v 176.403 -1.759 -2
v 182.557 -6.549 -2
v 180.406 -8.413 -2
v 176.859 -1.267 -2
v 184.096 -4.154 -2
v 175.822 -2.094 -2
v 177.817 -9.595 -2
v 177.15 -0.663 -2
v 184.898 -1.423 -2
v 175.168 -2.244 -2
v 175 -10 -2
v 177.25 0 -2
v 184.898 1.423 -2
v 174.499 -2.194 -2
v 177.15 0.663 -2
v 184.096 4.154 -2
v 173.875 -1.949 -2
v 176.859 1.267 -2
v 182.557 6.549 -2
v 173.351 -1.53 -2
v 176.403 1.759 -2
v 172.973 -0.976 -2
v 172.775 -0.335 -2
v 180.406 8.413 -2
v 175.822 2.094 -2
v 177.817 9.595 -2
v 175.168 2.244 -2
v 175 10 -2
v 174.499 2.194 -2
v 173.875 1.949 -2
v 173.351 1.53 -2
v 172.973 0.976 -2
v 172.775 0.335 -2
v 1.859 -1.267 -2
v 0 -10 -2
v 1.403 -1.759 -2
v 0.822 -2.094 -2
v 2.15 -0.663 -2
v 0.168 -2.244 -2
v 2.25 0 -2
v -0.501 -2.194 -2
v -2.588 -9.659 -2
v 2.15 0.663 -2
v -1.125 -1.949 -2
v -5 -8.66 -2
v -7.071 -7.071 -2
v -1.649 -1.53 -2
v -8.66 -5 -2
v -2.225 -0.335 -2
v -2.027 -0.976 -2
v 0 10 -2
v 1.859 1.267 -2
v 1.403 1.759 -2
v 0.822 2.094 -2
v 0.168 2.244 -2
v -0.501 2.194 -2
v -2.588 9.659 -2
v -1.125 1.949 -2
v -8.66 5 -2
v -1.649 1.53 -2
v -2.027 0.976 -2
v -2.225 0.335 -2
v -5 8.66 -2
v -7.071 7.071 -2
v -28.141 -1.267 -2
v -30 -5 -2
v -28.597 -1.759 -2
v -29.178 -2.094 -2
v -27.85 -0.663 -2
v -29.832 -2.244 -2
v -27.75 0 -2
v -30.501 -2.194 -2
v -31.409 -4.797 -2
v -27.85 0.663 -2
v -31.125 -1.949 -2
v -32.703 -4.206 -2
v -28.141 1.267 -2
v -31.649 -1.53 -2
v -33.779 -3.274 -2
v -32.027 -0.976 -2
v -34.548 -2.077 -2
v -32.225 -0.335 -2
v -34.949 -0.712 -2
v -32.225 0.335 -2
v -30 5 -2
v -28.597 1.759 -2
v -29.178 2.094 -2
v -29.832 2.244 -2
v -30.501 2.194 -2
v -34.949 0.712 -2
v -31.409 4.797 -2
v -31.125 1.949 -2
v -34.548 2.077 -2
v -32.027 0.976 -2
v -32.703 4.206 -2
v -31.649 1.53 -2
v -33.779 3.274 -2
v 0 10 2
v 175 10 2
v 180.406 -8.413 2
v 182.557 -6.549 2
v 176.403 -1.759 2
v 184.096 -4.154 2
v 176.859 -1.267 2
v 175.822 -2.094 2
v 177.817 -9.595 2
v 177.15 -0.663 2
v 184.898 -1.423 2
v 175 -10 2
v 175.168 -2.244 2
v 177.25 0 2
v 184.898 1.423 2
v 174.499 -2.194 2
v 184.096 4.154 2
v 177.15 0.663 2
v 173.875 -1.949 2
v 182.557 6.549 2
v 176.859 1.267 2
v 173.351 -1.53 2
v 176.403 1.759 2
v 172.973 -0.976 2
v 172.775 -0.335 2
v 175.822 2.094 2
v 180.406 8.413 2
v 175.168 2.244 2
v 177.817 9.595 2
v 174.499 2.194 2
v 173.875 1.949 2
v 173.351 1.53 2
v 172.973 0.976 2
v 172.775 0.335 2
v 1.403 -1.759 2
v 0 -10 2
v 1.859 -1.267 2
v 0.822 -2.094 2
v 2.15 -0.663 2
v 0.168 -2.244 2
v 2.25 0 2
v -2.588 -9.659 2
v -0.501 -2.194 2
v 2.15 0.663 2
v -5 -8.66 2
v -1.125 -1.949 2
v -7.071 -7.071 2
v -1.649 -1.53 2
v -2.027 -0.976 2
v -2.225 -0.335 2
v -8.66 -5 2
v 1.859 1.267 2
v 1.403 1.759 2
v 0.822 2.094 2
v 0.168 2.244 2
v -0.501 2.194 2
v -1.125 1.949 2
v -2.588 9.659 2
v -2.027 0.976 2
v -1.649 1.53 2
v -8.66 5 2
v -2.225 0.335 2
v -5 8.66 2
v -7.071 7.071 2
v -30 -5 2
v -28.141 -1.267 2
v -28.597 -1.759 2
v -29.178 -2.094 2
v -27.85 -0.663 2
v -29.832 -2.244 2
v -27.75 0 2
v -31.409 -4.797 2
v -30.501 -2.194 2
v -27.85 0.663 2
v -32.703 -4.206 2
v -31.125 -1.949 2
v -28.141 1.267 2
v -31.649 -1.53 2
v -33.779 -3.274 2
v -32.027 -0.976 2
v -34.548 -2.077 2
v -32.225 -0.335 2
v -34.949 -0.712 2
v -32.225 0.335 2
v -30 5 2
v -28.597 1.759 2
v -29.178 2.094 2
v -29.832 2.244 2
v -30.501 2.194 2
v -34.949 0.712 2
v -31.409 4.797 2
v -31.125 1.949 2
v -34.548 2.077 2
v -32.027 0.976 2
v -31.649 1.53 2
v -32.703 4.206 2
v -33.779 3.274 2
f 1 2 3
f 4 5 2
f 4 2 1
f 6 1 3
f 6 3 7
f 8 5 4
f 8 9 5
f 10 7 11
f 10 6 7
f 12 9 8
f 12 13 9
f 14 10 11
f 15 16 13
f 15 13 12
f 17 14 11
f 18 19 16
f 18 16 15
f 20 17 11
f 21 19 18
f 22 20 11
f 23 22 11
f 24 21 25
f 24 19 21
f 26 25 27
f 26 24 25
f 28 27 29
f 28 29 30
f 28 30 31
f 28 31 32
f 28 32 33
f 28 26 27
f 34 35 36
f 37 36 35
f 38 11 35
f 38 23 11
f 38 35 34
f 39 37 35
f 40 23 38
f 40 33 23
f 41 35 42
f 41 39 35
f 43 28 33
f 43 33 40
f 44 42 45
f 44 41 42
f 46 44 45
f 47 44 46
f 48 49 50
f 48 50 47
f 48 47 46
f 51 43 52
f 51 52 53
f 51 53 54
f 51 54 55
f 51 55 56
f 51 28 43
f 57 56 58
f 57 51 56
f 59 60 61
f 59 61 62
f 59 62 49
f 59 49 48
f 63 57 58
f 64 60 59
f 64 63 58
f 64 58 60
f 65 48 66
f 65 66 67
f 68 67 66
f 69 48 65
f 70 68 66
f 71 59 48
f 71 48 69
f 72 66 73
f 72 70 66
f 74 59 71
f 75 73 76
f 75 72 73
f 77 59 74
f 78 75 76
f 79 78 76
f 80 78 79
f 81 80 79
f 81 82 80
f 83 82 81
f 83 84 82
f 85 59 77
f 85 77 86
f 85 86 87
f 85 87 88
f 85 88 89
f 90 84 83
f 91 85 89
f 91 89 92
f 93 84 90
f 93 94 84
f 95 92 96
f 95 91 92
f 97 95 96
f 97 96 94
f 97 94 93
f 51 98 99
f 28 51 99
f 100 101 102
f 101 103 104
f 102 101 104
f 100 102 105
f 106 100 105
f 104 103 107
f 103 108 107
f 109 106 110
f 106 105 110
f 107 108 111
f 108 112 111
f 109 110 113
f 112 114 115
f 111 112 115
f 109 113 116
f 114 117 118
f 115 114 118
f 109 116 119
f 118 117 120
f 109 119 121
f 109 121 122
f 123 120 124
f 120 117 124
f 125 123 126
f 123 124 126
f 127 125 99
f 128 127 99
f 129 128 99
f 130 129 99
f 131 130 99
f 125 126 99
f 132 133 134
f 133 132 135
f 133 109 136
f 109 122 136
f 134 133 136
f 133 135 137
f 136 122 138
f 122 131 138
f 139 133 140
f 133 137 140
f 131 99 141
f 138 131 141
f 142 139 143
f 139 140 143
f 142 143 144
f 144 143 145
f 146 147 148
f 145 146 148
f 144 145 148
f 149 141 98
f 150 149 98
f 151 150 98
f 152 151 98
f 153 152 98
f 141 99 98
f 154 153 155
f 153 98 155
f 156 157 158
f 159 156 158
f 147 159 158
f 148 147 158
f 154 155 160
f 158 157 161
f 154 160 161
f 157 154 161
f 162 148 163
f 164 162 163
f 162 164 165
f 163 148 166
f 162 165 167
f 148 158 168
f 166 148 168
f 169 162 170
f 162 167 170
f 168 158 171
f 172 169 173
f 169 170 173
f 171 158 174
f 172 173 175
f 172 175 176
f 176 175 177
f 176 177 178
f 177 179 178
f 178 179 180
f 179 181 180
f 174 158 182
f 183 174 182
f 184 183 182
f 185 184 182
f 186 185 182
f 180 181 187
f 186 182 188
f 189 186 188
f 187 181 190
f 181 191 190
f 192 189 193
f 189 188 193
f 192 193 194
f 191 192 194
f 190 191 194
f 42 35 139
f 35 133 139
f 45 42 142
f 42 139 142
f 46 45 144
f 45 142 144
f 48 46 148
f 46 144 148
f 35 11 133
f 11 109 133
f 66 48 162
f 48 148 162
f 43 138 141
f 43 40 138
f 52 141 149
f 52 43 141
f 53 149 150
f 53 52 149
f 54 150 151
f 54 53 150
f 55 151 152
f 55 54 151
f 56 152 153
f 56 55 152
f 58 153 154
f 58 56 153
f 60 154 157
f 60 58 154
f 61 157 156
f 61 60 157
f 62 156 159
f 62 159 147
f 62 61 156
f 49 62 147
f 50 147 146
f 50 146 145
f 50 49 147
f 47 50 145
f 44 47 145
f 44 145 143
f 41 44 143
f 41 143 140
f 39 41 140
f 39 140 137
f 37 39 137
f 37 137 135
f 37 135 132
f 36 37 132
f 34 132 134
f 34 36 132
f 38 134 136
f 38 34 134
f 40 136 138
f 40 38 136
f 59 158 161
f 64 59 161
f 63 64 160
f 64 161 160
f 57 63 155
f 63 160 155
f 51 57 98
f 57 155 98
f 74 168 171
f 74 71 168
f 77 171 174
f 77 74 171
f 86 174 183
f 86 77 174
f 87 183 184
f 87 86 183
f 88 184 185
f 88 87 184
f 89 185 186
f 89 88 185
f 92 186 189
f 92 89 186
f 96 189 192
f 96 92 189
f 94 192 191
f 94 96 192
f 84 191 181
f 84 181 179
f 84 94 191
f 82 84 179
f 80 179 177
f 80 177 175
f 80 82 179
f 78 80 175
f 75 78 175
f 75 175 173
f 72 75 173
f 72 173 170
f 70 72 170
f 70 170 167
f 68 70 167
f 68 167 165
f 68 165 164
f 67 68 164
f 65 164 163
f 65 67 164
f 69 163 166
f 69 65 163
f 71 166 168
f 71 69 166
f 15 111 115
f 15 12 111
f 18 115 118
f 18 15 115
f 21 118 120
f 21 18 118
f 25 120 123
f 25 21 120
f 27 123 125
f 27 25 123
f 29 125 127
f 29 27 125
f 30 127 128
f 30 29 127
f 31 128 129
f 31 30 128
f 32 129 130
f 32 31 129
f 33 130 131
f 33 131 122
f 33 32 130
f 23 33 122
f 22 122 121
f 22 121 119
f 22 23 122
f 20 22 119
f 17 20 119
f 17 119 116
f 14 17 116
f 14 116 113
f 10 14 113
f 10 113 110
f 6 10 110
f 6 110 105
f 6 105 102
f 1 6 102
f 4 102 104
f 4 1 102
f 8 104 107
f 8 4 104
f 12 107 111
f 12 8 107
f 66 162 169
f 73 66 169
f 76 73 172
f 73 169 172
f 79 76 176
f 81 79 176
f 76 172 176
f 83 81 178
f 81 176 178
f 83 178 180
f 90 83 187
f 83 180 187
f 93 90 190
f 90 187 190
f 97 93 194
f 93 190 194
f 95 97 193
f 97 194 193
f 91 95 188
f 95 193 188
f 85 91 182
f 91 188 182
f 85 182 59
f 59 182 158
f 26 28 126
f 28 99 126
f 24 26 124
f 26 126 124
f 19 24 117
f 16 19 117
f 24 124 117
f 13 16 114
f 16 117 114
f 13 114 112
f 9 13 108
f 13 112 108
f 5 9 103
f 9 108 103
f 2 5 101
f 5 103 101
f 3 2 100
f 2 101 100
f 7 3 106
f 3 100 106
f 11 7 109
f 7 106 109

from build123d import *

# Parameters (mm, degrees)
SKETCH1_R           = 2.25
BOSS_EXTRUDE1_DEPTH = 2


with BuildPart() as part:
    # Sketch1 → Boss-Extrude1 (new, symmetric)
    with BuildSketch(Plane.XY):
        with BuildLine():
            Line((0, 10), (175, 10))
            ThreePointArc((175, 10), (185, 0), (175, -10))
            Line((175, -10), (0, -10))
            ThreePointArc((0, -10), (-5.00000204, -8.66025286), (-8.660256393, -4.99999592))
            Line((-8.660256393, -4.99999592), (-30, -5))
            ThreePointArc((-30, -5), (-35, 0), (-30, 5))
            Line((-30, 5), (-8.660256485, 4.999995761))
            ThreePointArc((-8.660256485, 4.999995761), (-5.000002119, 8.660252814), (0, 10))
        make_face()
        Circle(SKETCH1_R, mode=Mode.SUBTRACT)
        with Locations((-30, 0)):
            Circle(SKETCH1_R, mode=Mode.SUBTRACT)
        with Locations((175, 0)):
            Circle(SKETCH1_R, mode=Mode.SUBTRACT)
    extrude(amount=BOSS_EXTRUDE1_DEPTH, both=True)


solid = part.part
